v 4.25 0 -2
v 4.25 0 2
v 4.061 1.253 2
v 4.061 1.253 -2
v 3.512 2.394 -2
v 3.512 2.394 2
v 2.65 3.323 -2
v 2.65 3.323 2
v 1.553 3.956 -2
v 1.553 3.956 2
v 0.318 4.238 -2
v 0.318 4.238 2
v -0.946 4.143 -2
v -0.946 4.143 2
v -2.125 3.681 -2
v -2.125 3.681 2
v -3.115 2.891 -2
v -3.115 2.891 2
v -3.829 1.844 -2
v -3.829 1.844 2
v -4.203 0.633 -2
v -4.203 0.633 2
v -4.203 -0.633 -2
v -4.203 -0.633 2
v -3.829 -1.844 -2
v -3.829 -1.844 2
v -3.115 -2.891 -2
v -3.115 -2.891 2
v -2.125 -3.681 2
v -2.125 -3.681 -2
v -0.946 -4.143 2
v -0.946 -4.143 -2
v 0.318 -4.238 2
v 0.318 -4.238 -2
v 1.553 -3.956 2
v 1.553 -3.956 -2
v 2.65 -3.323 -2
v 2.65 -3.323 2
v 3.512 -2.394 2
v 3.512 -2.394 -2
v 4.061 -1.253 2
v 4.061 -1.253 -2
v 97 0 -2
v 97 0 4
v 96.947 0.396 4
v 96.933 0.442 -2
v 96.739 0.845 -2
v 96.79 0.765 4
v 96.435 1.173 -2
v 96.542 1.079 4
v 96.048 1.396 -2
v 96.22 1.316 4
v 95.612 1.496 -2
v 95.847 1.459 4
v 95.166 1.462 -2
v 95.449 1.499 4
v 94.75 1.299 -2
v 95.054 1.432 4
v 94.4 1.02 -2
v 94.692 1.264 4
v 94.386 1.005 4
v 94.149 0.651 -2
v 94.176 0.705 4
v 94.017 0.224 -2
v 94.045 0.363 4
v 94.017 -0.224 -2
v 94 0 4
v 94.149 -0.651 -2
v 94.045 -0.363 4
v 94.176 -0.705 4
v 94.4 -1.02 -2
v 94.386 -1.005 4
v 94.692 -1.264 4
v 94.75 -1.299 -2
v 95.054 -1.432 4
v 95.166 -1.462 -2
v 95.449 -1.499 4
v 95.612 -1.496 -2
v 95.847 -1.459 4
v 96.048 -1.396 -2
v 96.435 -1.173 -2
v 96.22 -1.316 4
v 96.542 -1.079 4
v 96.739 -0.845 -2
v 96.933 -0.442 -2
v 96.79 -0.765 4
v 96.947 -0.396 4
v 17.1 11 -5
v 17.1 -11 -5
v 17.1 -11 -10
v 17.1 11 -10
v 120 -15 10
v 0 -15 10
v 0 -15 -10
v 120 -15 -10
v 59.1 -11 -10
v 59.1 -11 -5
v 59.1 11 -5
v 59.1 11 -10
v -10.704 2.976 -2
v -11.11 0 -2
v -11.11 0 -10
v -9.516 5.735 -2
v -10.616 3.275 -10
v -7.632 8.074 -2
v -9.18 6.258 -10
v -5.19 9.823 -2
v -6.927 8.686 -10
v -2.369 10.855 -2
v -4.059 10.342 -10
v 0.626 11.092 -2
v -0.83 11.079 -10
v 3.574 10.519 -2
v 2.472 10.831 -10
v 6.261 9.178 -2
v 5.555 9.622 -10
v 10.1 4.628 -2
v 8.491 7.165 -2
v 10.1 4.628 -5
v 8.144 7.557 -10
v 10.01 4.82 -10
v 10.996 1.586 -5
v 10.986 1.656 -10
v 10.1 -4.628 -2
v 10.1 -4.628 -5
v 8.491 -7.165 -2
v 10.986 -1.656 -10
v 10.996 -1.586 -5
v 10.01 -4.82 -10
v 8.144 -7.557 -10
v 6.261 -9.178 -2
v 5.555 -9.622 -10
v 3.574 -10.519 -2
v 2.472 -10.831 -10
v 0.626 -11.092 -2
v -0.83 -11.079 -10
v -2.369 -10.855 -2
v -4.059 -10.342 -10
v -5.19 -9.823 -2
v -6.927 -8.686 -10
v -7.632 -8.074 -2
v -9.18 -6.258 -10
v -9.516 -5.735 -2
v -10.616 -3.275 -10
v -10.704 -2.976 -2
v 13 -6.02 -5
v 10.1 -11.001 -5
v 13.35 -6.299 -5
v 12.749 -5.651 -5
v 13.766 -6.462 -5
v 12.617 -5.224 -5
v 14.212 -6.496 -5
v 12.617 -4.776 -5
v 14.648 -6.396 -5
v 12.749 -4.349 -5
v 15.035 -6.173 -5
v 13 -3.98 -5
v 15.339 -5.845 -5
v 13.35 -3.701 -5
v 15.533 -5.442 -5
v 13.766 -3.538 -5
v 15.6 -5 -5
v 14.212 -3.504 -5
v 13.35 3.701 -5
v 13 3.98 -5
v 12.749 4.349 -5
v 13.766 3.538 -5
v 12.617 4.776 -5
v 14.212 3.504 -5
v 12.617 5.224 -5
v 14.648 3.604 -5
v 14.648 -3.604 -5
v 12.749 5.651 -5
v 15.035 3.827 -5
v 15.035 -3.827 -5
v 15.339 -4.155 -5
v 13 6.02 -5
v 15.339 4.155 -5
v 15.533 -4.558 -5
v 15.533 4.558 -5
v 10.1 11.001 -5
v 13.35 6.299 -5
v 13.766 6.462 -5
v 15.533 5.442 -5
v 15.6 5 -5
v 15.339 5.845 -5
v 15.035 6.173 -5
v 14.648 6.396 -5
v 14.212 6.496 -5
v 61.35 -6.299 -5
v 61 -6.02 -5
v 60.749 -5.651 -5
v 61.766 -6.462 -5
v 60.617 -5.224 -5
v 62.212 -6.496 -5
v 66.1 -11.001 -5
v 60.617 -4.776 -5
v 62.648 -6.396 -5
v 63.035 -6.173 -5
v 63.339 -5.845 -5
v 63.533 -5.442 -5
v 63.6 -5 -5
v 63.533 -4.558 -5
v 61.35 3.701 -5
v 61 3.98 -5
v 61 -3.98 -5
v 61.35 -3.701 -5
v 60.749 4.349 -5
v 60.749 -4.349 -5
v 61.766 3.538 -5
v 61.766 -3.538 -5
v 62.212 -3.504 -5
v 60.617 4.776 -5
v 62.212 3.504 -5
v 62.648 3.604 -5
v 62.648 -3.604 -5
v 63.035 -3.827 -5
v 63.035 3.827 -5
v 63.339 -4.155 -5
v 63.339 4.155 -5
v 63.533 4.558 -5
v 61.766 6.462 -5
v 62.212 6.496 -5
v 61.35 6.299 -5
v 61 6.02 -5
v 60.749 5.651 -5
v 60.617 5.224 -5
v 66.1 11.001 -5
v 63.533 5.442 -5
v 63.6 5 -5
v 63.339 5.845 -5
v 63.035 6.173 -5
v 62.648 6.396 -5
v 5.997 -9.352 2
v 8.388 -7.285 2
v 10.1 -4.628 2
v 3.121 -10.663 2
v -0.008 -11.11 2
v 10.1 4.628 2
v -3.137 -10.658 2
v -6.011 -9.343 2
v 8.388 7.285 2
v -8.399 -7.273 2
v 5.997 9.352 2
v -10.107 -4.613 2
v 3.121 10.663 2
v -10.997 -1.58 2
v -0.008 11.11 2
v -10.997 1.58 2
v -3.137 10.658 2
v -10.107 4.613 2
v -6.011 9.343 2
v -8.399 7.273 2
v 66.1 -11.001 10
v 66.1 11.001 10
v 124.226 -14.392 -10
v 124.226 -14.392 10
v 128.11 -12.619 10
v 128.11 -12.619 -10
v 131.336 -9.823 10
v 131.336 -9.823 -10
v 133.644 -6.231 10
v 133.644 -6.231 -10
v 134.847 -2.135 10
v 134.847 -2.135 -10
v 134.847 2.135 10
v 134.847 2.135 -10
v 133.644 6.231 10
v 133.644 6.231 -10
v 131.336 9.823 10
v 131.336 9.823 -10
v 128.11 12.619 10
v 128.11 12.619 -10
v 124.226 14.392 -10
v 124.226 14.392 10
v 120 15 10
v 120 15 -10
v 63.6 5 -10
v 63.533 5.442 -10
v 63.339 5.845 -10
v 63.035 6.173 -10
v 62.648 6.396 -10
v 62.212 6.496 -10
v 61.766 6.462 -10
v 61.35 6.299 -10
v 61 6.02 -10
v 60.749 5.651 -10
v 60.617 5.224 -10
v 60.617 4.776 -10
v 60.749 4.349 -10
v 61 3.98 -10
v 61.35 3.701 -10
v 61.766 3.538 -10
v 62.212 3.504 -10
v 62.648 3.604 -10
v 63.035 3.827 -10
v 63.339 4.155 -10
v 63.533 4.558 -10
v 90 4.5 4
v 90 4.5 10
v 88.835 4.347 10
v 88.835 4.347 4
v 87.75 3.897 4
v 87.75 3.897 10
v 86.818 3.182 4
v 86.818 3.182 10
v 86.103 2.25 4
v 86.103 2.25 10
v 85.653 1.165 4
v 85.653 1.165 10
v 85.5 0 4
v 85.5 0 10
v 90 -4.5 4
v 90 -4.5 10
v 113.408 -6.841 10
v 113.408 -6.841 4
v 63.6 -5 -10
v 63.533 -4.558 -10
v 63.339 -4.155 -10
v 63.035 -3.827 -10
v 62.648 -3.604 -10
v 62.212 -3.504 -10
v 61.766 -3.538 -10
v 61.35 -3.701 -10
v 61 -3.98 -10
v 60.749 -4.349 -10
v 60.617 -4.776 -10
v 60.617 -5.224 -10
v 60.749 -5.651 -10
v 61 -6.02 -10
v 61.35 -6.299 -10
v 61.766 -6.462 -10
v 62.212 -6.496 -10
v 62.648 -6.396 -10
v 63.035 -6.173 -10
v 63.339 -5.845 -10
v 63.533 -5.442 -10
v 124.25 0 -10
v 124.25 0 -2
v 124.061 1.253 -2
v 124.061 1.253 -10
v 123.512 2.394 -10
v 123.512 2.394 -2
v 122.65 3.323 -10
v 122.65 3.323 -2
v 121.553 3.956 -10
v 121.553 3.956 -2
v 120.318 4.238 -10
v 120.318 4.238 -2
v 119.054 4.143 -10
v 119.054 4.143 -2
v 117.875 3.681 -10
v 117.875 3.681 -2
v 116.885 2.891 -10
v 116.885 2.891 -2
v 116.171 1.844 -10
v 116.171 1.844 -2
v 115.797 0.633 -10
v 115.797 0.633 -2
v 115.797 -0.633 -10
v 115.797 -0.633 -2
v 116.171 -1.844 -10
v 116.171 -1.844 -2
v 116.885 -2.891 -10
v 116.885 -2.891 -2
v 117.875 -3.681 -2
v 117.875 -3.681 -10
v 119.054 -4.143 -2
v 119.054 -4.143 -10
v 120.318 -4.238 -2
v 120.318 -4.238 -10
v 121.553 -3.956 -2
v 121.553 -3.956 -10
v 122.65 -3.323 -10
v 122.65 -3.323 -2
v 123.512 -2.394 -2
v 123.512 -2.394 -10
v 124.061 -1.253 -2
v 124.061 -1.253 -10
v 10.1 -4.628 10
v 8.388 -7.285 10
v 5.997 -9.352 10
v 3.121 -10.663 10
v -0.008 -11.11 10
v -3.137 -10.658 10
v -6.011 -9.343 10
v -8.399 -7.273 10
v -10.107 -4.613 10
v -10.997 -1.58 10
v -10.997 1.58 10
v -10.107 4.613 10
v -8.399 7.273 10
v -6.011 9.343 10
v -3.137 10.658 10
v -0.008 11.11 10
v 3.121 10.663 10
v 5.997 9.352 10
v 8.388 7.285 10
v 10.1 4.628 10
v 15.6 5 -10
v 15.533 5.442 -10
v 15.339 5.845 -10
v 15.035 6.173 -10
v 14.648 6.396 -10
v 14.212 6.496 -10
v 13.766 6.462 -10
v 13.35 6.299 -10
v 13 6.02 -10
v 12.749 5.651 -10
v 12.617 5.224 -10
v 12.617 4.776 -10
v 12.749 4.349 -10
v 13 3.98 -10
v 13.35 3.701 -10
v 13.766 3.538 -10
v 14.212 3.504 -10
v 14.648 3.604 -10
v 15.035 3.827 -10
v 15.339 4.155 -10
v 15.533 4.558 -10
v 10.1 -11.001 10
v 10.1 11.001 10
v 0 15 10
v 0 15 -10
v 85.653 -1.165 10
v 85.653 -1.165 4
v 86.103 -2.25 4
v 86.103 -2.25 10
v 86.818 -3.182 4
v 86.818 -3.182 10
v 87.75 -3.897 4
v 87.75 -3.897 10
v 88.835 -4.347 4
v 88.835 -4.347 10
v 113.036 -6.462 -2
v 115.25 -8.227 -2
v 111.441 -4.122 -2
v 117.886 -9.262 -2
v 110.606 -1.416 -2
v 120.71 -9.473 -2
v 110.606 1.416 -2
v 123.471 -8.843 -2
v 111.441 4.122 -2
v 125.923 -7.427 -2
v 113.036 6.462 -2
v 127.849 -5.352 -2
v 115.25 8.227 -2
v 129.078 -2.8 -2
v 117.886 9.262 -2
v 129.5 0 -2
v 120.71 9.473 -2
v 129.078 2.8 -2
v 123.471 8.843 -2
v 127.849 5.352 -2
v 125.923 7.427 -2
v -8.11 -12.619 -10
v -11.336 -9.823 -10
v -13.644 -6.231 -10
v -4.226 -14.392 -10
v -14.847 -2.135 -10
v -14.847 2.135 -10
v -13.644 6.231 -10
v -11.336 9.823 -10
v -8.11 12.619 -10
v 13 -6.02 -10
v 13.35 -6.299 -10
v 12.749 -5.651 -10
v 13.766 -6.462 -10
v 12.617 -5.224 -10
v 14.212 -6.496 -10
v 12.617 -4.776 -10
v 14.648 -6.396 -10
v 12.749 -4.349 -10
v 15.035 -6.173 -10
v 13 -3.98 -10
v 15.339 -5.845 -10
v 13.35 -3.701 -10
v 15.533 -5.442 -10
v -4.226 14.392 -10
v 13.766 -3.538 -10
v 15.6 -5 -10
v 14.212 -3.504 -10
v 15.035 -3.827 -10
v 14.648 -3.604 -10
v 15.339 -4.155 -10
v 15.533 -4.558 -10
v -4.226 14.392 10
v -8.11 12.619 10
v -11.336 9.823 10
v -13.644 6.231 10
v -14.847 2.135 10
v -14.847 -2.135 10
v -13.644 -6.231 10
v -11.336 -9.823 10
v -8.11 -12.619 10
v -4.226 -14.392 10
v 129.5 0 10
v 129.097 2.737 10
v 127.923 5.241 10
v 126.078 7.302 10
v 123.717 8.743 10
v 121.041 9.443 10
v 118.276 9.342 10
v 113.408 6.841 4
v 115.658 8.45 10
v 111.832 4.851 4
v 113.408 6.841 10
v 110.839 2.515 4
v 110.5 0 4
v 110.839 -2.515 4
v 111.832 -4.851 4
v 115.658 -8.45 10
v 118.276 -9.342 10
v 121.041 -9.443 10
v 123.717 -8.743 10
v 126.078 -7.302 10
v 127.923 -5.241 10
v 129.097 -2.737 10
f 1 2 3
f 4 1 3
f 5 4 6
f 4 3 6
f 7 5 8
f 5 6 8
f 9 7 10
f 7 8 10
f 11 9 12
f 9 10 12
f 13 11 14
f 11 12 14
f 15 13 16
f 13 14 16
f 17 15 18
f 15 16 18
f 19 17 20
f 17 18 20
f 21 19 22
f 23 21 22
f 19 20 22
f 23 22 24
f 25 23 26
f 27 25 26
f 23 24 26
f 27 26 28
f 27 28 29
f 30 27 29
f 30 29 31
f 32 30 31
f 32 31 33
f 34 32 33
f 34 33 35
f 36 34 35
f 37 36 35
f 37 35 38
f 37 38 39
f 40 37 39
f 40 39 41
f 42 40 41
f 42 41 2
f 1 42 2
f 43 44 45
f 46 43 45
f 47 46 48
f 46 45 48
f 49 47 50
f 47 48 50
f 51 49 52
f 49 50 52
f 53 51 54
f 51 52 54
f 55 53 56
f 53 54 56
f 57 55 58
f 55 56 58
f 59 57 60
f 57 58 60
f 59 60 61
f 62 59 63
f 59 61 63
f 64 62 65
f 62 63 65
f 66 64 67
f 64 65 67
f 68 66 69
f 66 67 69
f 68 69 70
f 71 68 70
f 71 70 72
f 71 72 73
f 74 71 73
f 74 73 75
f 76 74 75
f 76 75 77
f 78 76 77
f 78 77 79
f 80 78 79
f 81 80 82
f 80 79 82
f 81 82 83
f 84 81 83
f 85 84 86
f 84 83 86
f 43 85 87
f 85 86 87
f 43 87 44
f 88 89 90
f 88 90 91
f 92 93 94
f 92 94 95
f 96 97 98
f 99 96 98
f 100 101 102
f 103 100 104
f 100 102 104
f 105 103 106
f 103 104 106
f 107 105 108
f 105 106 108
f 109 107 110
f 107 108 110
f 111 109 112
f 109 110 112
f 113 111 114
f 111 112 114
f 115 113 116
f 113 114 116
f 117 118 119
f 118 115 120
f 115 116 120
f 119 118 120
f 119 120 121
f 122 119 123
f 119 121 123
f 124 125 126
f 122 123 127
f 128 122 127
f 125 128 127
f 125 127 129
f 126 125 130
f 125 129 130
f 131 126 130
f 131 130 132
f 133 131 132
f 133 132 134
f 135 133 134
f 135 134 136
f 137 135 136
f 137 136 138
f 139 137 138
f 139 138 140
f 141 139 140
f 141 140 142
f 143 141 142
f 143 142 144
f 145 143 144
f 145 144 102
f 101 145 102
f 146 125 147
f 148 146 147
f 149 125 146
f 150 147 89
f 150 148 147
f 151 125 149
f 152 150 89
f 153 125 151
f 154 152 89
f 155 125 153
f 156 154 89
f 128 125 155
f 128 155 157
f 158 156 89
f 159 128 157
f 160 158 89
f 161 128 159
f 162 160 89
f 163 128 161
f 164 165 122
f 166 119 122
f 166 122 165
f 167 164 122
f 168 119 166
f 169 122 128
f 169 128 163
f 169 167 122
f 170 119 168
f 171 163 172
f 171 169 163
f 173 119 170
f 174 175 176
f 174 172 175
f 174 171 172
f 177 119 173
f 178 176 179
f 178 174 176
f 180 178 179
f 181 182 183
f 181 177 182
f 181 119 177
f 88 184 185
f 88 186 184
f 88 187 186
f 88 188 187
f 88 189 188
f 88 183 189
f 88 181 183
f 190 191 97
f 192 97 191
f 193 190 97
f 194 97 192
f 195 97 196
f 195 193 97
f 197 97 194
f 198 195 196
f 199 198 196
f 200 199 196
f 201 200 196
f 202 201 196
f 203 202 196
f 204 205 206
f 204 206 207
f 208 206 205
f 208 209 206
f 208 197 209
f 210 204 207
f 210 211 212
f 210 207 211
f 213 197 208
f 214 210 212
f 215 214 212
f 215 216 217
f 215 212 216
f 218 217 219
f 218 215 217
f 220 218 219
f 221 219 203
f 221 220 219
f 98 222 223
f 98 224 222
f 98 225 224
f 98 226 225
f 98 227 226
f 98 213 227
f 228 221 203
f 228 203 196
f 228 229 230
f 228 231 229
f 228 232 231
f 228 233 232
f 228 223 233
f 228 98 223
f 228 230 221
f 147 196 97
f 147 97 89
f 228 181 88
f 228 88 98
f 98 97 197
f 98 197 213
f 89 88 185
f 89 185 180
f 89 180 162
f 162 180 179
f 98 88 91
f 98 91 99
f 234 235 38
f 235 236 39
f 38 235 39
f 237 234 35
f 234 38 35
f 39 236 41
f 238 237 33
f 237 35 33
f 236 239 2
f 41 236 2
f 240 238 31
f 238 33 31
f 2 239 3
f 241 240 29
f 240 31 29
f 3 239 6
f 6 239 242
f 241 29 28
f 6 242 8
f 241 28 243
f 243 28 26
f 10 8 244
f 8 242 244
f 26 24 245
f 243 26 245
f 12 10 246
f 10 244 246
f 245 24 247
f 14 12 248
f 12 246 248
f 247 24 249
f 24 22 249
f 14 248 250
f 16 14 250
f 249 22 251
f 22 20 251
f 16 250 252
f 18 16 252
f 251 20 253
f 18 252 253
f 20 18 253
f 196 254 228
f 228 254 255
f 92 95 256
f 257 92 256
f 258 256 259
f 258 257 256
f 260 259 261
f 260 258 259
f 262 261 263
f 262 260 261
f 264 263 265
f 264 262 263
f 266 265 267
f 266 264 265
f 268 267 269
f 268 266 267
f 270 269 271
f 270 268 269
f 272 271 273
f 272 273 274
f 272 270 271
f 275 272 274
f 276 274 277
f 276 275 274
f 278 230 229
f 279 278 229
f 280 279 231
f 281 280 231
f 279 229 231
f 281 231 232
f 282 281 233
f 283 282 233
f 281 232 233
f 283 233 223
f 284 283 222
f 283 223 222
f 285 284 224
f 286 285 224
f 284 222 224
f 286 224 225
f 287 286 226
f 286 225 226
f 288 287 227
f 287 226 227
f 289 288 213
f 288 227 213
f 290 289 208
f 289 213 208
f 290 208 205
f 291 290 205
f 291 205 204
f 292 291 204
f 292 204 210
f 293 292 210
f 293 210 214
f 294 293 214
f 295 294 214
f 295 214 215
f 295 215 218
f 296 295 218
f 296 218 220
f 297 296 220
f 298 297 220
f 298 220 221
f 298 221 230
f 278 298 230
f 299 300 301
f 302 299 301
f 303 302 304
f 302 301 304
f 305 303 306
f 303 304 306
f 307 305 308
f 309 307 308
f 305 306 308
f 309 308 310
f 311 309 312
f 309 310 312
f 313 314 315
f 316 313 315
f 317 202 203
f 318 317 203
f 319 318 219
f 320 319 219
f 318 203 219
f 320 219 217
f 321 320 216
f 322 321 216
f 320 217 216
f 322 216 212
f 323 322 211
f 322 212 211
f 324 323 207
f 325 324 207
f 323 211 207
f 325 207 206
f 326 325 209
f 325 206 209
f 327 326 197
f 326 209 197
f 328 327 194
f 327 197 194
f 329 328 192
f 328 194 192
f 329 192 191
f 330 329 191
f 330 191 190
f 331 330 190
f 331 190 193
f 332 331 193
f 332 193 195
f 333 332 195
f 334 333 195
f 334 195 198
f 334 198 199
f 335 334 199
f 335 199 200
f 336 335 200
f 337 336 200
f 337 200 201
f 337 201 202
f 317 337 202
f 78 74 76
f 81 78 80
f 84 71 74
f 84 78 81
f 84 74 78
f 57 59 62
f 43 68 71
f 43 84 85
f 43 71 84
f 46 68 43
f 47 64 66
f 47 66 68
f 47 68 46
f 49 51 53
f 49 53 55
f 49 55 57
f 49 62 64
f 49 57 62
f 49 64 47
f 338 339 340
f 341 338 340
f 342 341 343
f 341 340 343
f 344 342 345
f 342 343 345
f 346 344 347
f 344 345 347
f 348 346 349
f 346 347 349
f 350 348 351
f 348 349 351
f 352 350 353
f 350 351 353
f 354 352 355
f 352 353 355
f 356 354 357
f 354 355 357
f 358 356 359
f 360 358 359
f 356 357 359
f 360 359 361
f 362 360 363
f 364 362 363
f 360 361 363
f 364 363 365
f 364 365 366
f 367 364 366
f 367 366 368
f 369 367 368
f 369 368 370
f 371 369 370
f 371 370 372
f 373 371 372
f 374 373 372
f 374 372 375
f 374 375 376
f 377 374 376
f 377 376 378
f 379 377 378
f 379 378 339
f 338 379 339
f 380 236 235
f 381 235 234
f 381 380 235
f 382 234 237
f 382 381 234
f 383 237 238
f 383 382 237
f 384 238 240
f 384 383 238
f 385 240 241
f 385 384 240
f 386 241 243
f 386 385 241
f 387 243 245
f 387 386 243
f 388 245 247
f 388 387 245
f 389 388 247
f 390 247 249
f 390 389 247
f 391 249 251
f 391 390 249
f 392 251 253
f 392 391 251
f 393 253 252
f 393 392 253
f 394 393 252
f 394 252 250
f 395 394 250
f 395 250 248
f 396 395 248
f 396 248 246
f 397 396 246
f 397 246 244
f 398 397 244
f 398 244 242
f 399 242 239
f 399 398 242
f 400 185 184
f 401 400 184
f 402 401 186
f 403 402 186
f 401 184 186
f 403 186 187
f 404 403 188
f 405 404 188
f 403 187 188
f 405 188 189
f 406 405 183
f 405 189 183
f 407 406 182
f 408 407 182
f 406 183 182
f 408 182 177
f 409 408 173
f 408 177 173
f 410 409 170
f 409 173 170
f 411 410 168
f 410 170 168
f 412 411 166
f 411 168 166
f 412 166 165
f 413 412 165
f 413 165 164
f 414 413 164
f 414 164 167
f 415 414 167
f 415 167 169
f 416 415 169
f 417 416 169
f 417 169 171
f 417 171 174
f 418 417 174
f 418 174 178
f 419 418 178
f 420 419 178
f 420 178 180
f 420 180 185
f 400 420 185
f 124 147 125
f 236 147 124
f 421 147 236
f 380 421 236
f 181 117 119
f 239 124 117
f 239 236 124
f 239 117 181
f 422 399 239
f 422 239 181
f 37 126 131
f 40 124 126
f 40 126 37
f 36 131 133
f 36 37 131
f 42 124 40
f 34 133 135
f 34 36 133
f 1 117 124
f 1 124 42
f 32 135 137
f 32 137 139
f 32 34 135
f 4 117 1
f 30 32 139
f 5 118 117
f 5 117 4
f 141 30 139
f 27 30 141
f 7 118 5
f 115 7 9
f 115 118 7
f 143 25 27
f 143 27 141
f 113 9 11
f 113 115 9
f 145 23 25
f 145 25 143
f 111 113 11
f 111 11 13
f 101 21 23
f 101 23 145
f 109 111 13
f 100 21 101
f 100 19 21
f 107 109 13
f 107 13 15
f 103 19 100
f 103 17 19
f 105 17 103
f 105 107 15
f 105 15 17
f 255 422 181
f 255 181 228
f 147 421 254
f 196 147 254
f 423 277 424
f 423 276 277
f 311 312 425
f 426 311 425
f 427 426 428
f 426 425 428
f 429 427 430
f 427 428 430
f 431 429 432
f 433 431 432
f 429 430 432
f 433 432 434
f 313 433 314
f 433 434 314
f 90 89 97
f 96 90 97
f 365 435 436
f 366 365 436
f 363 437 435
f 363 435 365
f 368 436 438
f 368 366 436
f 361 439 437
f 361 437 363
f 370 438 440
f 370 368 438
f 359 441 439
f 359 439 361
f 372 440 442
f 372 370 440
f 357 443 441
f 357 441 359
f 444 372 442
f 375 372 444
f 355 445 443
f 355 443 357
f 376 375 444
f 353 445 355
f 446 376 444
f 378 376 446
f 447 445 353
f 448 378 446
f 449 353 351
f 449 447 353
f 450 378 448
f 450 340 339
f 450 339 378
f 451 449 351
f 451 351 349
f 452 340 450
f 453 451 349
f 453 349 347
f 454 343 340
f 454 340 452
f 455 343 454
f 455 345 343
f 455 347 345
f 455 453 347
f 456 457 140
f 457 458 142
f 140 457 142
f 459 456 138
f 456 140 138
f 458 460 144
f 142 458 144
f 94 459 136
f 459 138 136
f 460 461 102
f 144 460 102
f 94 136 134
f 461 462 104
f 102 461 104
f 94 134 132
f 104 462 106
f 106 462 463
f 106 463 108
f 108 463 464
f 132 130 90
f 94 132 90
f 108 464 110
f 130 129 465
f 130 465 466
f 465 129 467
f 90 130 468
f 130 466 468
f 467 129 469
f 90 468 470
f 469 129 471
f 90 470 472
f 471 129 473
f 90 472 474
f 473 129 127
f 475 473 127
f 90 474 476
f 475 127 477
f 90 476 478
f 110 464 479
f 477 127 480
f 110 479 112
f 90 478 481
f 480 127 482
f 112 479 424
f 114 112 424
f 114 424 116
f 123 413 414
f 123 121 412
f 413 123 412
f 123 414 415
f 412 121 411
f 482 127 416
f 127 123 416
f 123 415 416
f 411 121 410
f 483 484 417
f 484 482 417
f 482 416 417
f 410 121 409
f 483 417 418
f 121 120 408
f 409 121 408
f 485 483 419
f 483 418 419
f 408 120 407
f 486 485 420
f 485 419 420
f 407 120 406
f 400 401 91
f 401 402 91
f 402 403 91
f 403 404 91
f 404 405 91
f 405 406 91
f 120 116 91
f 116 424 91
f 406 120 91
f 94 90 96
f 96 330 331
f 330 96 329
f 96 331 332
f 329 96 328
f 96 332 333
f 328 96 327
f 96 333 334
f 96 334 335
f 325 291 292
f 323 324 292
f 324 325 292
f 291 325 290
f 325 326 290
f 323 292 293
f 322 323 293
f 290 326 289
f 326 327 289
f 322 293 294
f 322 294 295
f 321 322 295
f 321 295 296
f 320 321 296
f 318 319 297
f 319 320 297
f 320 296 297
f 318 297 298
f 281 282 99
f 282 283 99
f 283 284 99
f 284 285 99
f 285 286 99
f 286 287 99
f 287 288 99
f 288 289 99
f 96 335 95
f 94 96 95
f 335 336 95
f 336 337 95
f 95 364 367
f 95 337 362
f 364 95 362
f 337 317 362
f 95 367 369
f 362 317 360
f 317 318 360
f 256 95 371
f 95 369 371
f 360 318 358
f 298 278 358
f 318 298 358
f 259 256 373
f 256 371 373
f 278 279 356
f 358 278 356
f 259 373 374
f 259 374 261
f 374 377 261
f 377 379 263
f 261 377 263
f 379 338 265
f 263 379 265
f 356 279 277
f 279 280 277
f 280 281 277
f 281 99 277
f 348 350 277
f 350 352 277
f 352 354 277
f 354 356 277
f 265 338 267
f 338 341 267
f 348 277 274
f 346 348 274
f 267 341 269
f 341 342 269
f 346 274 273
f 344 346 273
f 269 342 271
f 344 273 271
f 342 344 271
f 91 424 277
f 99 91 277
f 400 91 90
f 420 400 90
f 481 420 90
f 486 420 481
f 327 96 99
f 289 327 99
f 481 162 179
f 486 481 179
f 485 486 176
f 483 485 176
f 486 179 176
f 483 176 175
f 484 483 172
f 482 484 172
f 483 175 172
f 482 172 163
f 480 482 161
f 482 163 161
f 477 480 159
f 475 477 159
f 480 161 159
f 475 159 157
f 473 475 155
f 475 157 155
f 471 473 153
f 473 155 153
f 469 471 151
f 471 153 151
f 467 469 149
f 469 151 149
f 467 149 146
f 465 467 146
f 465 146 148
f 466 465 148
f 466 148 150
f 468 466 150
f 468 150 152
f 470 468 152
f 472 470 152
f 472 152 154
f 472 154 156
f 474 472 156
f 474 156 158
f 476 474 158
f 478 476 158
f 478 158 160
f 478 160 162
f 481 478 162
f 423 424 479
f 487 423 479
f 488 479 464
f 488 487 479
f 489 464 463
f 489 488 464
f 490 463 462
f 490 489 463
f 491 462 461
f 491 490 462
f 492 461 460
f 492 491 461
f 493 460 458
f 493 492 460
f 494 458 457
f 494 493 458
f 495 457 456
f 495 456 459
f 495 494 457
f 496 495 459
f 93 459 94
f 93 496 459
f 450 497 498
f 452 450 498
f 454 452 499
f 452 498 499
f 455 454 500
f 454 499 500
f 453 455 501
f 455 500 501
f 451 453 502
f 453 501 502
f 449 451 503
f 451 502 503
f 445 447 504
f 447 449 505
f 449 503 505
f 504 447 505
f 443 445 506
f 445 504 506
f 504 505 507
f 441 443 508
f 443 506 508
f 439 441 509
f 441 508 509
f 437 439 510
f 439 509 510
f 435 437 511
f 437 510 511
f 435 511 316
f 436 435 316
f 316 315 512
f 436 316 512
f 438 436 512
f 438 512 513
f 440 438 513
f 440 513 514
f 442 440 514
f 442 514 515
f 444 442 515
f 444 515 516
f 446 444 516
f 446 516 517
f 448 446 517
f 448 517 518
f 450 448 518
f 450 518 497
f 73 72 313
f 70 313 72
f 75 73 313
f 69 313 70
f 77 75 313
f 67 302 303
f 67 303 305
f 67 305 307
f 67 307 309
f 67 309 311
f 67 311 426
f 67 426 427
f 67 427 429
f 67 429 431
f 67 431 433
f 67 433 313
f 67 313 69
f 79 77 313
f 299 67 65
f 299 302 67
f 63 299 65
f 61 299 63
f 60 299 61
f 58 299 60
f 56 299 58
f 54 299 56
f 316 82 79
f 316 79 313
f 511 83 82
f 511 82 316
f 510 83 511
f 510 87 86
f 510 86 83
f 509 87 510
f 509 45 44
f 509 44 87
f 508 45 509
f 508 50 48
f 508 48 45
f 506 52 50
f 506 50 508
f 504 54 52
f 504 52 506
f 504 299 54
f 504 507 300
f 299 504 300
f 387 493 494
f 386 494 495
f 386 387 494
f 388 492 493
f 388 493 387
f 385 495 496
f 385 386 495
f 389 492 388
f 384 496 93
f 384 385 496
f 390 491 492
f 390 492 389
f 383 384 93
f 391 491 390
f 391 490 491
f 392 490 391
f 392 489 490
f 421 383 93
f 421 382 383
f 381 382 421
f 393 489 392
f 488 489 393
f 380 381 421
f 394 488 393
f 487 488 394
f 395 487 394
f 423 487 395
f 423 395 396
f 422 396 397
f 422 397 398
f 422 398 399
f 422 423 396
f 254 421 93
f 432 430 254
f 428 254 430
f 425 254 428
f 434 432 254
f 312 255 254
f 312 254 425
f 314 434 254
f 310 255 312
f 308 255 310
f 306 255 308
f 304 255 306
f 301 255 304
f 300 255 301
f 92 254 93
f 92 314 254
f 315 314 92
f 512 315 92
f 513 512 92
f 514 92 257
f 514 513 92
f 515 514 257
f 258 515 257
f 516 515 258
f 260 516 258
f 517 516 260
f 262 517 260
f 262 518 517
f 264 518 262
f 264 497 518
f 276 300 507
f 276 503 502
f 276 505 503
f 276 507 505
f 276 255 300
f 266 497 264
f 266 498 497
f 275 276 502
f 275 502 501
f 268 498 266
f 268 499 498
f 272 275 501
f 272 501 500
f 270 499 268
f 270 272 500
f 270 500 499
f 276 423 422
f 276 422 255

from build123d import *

# Parameters (mm, degrees)
BOSS_EXTRUDE1_DEPTH = 10
CUT_EXTRUDE4_DEPTH  = 6
SKETCH3_3_R         = 7.5
SKETCH3_3_R_2       = 4.25
SKETCH3_3_R_3       = 1.5
CUT_EXTRUDE5_DEPTH  = 12
SKETCH3_4_R         = 4.25
CUT_EXTRUDE6_DEPTH  = 138.295302177
SKETCH4_R           = 4.25
SKETCH4_W           = 42
SKETCH4_H           = 22
CUT_EXTRUDE8_DEPTH  = 138.295302177
SKETCH5_R           = 11.11
CUT_EXTRUDE10_DEPTH = 8
SKETCH7_W           = 56
SKETCH7_H           = 22.002715538
CUT_EXTRUDE12_DEPTH = 15
SKETCH8_R           = 1.5
CUT_EXTRUDE13_DEPTH = 14
CUT_EXTRUDE14_REACH = 139.295
SKETCH9_R           = 9.5


with BuildPart() as part:
    # Sketch1 → Boss-Extrude1 (new, symmetric)
    with BuildSketch(Plane.XY):
        with BuildLine():
            Line((120, 15), (0, 15))
            ThreePointArc((0, 15), (-15, 0), (0, -15))
            Line((0, -15), (120, -15))
            ThreePointArc((120, -15), (135, 0), (120, 15))
        make_face()
    extrude(amount=BOSS_EXTRUDE1_DEPTH, both=True)

    # Sketch3 → Cut-Extrude4 (cut)
    with BuildSketch(Plane.XY.offset(10)):
        with BuildLine():
            ThreePointArc((90, 4.5), (86.818019485, 3.181980515), (85.5, 0))
            Line((85.5, 0), (94, 0))
            ThreePointArc((94, 0), (94.099918834, 0.538305422), (94.386363636, 1.004895044))
            ThreePointArc((94.386363636, 1.004895044), (92.80427997, 3.519376912), (90, 4.5))
        make_face()
        with BuildLine():
            Line((94, 0), (85.5, 0))
            ThreePointArc((85.5, 0), (86.818019485, -3.181980515), (90, -4.5))
            ThreePointArc((90, -4.5), (92.80427997, -3.519376912), (94.386363636, -1.004895044))
            ThreePointArc((94.386363636, -1.004895044), (94.099918834, -0.538305422), (94, 0))
        make_face()
        with BuildLine():
            Line((118.514851485, 7.351485149), (90, 4.5))
            ThreePointArc((90, 4.5), (92.80427997, 3.519376912), (94.386363636, 1.004895044))
            ThreePointArc((94.386363636, 1.004895044), (96.038305422, 1.400081166), (97, 0))
            ThreePointArc((97, 0), (96.038305422, -1.400081166), (94.386363636, -1.004895044))
            ThreePointArc((94.386363636, -1.004895044), (92.80427997, -3.519376912), (90, -4.5))
            Line((90, -4.5), (118.514851485, -7.351485149))
            ThreePointArc((118.514851485, -7.351485149), (112.5, 0), (118.514851485, 7.351485149))
        make_face()
    extrude(amount=-CUT_EXTRUDE4_DEPTH, mode=Mode.SUBTRACT)

    # Sketch3<3> → Cut-Extrude5 (cut)
    # profile 1 of 2: a face of its own
    with BuildSketch(Plane.XY.offset(10)):
        with Locations((120, 0)):
            Circle(SKETCH3_3_R)
        with Locations((120, 0)):
            Circle(SKETCH3_3_R_2, mode=Mode.SUBTRACT)
    # profile 2 of 2: a face of its own
    with BuildSketch(Plane.XY.offset(10)):
        with Locations((95.5, 0)):
            Circle(SKETCH3_3_R_3)
    extrude(amount=-CUT_EXTRUDE5_DEPTH, mode=Mode.SUBTRACT)

    # Sketch3<4> → Cut-Extrude6 (cut, through all)
    with BuildSketch(Plane.XY.offset(10)):
        with Locations((120, 0)):
            Circle(SKETCH3_4_R)
    extrude(amount=-CUT_EXTRUDE6_DEPTH, mode=Mode.SUBTRACT)

    # Sketch4 → Cut-Extrude8 (cut, through all)
    with BuildSketch(Plane.XY.offset(10)):
        Circle(SKETCH4_R)
        with Locations((38.1, 0)):
            Rectangle(SKETCH4_W, SKETCH4_H)
    extrude(amount=-CUT_EXTRUDE8_DEPTH, mode=Mode.SUBTRACT)

    # Sketch5 → Cut-Extrude10 (cut)
    with BuildSketch(Plane(origin=(0, 0, -10), x_dir=(-1, 0, 0), z_dir=(0, 0, -1))):
        Circle(SKETCH5_R)
    cut_extrude10 = extrude(amount=-CUT_EXTRUDE10_DEPTH, mode=Mode.SUBTRACT)

    # Mirror2: Cut-Extrude10 across plane
    add(cut_extrude10.mirror(Plane.XY), mode=Mode.SUBTRACT)

    # Sketch7 → Cut-Extrude12 (cut)
    with BuildSketch(Plane.XY.offset(10)):
        with Locations((38.1, 0)):
            Rectangle(SKETCH7_W, SKETCH7_H)
    extrude(amount=-CUT_EXTRUDE12_DEPTH, mode=Mode.SUBTRACT)

    # Sketch8 → Cut-Extrude13 (cut)
    with BuildSketch(Plane.XY.offset(-5)):
        with Locations((14.1, 5)):
            Circle(SKETCH8_R)
        with Locations((14.1, -5)):
            Circle(SKETCH8_R)
        with Locations((62.1, -5)):
            Circle(SKETCH8_R)
        with Locations((62.1, 5)):
            Circle(SKETCH8_R)
    extrude(amount=-CUT_EXTRUDE13_DEPTH, mode=Mode.SUBTRACT)

    # Cut-Extrude14: up to this face of the body (flat: up to its plane)
    cut_extrude14_end = Plane(part.part.faces().sort_by_distance((112.712132034, 0, -2))[0])
    # Sketch9 → Cut-Extrude14 (cut, up to the picked face)
    with BuildSketch(Plane.XY.offset(10), mode=Mode.PRIVATE) as cut_extrude14_sk1:
        with Locations((120, 0)):
            Circle(SKETCH9_R)
    cut_extrude14_tool1 = split(extrude(cut_extrude14_sk1.sketch, amount=-CUT_EXTRUDE14_REACH, mode=Mode.PRIVATE), bisect_by=cut_extrude14_end, keep=Keep.BOTH, mode=Mode.PRIVATE)
    add(cut_extrude14_tool1.solids().sort_by(Axis((120, 0, 10), (0, 0, -1)))[0], mode=Mode.SUBTRACT)


solid = part.part
